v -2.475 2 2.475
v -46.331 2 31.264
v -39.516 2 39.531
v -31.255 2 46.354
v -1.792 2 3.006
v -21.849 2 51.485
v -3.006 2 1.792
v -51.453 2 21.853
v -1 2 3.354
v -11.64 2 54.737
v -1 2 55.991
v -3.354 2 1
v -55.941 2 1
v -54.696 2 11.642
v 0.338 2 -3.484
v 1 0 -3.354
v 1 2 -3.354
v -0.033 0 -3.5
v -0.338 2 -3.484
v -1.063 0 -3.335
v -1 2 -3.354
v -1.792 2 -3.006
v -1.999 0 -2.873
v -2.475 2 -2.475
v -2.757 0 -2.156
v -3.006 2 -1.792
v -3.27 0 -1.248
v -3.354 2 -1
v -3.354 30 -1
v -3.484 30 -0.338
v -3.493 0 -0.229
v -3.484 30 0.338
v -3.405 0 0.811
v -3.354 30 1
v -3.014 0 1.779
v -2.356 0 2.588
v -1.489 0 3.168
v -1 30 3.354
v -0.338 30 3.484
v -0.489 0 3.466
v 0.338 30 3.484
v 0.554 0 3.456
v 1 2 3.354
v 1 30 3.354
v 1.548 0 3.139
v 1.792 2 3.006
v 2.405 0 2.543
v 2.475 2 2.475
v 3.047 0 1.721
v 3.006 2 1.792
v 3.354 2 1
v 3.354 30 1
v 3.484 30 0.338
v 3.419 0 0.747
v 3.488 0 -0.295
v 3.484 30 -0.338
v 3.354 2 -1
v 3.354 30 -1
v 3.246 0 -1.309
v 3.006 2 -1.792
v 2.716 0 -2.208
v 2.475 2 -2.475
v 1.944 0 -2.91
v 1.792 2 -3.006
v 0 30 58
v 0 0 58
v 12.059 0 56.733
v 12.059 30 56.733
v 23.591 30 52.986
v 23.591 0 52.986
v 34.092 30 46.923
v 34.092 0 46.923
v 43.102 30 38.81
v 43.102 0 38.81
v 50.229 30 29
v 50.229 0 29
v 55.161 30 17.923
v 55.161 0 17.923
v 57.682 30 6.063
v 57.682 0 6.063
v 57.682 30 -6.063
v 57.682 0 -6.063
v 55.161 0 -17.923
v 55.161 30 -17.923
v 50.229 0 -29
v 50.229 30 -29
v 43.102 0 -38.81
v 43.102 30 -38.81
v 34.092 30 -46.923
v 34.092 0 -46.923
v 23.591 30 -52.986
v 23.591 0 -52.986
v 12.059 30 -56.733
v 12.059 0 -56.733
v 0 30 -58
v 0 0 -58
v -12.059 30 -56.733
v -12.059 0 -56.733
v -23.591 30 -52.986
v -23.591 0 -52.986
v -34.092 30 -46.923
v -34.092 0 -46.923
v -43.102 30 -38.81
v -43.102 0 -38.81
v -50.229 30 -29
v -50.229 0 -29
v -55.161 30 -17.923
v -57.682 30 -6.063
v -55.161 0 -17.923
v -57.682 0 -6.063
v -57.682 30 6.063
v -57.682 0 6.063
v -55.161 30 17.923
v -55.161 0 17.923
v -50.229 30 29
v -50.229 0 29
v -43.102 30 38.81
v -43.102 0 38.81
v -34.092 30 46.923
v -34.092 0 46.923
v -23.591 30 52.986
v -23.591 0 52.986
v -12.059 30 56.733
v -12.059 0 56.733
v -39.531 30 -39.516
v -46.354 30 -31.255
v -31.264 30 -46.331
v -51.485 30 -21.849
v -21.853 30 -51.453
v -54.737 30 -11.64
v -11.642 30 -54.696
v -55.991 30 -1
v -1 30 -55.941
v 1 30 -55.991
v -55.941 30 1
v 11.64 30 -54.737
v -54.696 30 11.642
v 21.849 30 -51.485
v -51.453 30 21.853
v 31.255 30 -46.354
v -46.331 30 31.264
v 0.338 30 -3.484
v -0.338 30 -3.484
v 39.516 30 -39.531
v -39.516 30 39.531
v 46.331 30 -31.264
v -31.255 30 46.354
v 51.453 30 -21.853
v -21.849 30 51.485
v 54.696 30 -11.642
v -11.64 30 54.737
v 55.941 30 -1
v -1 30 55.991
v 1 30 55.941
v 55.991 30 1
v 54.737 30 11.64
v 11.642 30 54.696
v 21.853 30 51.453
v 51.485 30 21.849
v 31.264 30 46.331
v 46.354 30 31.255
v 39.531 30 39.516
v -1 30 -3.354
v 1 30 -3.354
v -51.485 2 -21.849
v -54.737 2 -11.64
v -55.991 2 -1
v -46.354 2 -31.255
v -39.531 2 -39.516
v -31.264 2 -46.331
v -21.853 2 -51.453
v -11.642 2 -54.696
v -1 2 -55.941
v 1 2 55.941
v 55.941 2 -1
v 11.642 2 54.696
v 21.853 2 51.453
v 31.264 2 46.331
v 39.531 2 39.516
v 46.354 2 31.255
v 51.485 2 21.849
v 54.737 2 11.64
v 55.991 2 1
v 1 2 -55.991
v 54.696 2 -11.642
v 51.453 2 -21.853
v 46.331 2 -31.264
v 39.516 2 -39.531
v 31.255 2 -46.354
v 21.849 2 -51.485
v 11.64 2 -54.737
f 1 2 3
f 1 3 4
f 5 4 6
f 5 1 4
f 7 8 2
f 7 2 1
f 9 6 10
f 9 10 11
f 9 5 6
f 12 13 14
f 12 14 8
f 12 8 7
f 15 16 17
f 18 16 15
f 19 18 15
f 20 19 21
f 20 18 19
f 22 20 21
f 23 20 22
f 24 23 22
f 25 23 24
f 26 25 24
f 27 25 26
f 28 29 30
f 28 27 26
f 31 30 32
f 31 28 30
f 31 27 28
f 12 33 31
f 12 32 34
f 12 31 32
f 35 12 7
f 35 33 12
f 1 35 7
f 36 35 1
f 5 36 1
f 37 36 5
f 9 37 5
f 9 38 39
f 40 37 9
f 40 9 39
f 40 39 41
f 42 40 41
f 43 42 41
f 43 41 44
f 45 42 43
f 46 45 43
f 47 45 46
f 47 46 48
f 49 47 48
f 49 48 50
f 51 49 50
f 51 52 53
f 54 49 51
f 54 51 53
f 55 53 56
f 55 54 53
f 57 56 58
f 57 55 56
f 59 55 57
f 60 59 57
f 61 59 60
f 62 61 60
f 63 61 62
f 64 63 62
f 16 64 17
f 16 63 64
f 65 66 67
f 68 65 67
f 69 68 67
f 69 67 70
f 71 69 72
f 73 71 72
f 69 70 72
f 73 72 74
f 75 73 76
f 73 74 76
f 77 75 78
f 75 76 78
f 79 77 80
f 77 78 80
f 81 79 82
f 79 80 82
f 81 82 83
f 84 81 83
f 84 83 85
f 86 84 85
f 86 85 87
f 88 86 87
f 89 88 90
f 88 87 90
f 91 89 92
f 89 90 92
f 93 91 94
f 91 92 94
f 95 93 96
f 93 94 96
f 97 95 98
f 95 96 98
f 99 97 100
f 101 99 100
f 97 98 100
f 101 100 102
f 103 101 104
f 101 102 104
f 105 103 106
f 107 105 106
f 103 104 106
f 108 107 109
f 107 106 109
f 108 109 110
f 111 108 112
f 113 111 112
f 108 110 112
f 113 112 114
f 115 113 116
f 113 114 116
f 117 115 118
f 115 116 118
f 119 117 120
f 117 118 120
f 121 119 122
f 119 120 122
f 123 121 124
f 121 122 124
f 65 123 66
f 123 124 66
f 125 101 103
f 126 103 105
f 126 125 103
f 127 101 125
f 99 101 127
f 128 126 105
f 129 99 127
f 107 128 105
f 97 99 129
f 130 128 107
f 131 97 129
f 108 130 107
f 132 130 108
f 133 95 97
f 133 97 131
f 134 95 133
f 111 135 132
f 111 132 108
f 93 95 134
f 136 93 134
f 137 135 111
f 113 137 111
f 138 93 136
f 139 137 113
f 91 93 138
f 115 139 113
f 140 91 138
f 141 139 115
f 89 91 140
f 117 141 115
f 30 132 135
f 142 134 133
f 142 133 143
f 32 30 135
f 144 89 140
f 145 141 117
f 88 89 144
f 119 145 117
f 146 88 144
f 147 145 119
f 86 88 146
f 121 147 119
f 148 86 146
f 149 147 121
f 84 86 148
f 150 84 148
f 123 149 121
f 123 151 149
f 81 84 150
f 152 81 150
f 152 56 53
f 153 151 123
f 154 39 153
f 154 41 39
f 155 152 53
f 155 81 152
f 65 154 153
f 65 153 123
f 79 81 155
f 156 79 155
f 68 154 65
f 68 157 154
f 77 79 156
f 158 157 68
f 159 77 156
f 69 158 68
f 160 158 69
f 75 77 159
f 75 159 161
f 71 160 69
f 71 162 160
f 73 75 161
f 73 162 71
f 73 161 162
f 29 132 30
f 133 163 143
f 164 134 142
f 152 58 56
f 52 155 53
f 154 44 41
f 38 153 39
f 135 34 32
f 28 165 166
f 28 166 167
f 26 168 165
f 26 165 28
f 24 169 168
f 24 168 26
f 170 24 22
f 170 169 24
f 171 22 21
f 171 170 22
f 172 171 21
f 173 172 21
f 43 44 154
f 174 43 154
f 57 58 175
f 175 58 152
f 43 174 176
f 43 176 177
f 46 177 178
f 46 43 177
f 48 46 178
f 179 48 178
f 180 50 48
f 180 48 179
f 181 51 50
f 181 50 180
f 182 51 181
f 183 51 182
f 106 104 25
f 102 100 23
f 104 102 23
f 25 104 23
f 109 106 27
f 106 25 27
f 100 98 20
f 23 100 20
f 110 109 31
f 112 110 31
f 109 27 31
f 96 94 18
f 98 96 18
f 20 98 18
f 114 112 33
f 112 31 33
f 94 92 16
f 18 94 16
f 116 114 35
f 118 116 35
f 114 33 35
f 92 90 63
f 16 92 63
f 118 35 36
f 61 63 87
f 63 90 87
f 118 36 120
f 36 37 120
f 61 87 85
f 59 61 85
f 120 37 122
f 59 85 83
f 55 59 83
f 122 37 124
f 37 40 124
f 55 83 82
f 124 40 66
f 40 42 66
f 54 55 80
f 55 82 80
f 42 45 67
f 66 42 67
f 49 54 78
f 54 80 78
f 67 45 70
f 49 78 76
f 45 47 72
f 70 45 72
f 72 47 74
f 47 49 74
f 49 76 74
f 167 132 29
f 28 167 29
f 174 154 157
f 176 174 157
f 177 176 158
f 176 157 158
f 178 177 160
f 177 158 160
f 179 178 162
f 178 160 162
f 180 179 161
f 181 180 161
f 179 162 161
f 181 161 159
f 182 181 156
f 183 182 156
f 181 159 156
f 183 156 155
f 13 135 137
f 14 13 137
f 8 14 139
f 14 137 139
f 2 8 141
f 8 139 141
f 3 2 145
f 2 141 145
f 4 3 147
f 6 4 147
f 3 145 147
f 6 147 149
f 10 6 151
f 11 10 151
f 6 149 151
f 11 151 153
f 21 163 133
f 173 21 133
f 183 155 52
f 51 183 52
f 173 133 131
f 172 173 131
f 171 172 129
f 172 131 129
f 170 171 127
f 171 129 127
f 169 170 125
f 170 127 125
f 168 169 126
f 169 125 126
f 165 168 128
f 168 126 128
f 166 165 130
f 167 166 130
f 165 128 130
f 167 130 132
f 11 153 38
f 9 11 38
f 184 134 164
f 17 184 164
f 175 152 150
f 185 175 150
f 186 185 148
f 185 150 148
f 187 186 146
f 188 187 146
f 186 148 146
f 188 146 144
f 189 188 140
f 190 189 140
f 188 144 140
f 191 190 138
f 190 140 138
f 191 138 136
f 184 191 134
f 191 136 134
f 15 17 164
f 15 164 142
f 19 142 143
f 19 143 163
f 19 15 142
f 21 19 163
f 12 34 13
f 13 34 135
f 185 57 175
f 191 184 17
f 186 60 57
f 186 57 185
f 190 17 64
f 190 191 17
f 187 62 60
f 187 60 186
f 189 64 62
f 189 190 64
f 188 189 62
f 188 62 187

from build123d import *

# Parameters (mm, degrees)
ESQUISSE2_R              = 58
BOSS_EXTRU_2_DEPTH       = 30
ENL_V_MAT_EXTRU_2_DEPTH  = 28
ENL_V_MAT_EXTRU_3_DEPTH  = 28
ENL_V_MAT_EXTRU_8_DEPTH  = 28
ENL_V_MAT_EXTRU_10_DEPTH = 28
ESQUISSE18_R             = 3
ENL_V_MAT_EXTRU_11_DEPTH = 30
ESQUISSE21_R             = 3.5
ENL_V_MAT_EXTRU_13_DEPTH = 28
ENL_V_START              = -10
ESQUISSE22_R             = 3.5
ENL_V_MAT_EXTRU_14_DEPTH = 10


with BuildPart() as part:
    # Esquisse2 → Boss.-Extru.2 (new body)
    with BuildSketch(Plane(origin=(0, 0, 0), x_dir=(1, 0, 0), z_dir=(0, 1, 0))):
        with Locations(Location((0, 0, 0), (0, 0, 270))):
            Circle(ESQUISSE2_R)
    extrude(amount=BOSS_EXTRU_2_DEPTH)

    # Esquisse3 → Enlèv. mat.-Extru.2 (cut)
    with BuildSketch(Plane(origin=(0, 30, 0), x_dir=(1, 0, 0), z_dir=(0, 1, 0))):
        with BuildLine():
            Line((-55.99137867, 1), (-1, 1))
            Line((-1, 1), (-1, 55.940862442))
            ThreePointArc((-1, 55.940862442), (-39.531080805, 39.515969353), (-55.99137867, 1))
        make_face()
    extrude(amount=-ENL_V_MAT_EXTRU_2_DEPTH, mode=Mode.SUBTRACT)

    # Esquisse5 → Enlèv. mat.-Extru.3 (cut)
    with BuildSketch(Plane(origin=(0, 30, 0), x_dir=(1, 0, 0), z_dir=(0, 1, 0))):
        with BuildLine():
            Line((0.999998069, 55.991388398), (0.999998069, 1.000009729))
            Line((0.999998069, 1.000009729), (55.940860512, 1.000009729))
            ThreePointArc((55.940860512, 1.000009729), (39.515967422, 39.531090534), (0.999998069, 55.991388398))
        make_face()
    extrude(amount=-ENL_V_MAT_EXTRU_3_DEPTH, mode=Mode.SUBTRACT)

    # Esquisse14 → Enlèv. mat.-Extru.8 (cut)
    with BuildSketch(Plane(origin=(0, 30, 0), x_dir=(1, 0, 0), z_dir=(0, 1, 0))):
        with BuildLine():
            Line((-1.000000805, -55.991378782), (-1.000000805, -1.000000112))
            Line((-1.000000805, -1.000000112), (-55.940863247, -1.000000112))
            ThreePointArc((-55.940863247, -1.000000112), (-39.515970158, -39.531080917), (-1.000000805, -55.991378782))
        make_face()
    extrude(amount=-ENL_V_MAT_EXTRU_8_DEPTH, mode=Mode.SUBTRACT)

    # Esquisse17 → Enlèv. mat.-Extru.10 (cut)
    with BuildSketch(Plane(origin=(0, 30, 0), x_dir=(1, 0, 0), z_dir=(0, 1, 0))):
        with BuildLine():
            Line((55.991361526, -0.999992166), (0.999998069, -1.000000112))
            Line((0.999998069, -1.000000112), (0.999982856, -55.940854608))
            ThreePointArc((0.999982856, -55.940854608), (39.531063661, -39.515961519), (55.991361526, -0.999992166))
        make_face()
    extrude(amount=-ENL_V_MAT_EXTRU_10_DEPTH, mode=Mode.SUBTRACT)

    # Esquisse18 → Enlèv. mat.-Extru.11 (cut)
    with BuildSketch(Plane.XZ):
        with Locations(Location((0, 0, 0), (0, 0, 270))):
            Circle(ESQUISSE18_R)
    extrude(amount=-ENL_V_MAT_EXTRU_11_DEPTH, mode=Mode.SUBTRACT)

    # Esquisse21 → Enlèv. mat.-Extru.13 (cut)
    with BuildSketch(Plane(origin=(0, 2, 0), x_dir=(1, 0, 0), z_dir=(0, 1, 0))):
        Circle(ESQUISSE21_R)
    extrude(amount=ENL_V_MAT_EXTRU_13_DEPTH, mode=Mode.SUBTRACT)

    # Esquisse22 → Enlèv. mat.-Extru.14 (cut)
    with BuildSketch(Plane(origin=(0, 2, 0), x_dir=(1, 0, 0), z_dir=(0, 1, 0)).offset(ENL_V_START)):
        with Locations(Location((0, 0, 0), (0, 0, 73.398483382))):
            Circle(ESQUISSE22_R)
    extrude(amount=ENL_V_MAT_EXTRU_14_DEPTH, mode=Mode.SUBTRACT)


solid = part.part
